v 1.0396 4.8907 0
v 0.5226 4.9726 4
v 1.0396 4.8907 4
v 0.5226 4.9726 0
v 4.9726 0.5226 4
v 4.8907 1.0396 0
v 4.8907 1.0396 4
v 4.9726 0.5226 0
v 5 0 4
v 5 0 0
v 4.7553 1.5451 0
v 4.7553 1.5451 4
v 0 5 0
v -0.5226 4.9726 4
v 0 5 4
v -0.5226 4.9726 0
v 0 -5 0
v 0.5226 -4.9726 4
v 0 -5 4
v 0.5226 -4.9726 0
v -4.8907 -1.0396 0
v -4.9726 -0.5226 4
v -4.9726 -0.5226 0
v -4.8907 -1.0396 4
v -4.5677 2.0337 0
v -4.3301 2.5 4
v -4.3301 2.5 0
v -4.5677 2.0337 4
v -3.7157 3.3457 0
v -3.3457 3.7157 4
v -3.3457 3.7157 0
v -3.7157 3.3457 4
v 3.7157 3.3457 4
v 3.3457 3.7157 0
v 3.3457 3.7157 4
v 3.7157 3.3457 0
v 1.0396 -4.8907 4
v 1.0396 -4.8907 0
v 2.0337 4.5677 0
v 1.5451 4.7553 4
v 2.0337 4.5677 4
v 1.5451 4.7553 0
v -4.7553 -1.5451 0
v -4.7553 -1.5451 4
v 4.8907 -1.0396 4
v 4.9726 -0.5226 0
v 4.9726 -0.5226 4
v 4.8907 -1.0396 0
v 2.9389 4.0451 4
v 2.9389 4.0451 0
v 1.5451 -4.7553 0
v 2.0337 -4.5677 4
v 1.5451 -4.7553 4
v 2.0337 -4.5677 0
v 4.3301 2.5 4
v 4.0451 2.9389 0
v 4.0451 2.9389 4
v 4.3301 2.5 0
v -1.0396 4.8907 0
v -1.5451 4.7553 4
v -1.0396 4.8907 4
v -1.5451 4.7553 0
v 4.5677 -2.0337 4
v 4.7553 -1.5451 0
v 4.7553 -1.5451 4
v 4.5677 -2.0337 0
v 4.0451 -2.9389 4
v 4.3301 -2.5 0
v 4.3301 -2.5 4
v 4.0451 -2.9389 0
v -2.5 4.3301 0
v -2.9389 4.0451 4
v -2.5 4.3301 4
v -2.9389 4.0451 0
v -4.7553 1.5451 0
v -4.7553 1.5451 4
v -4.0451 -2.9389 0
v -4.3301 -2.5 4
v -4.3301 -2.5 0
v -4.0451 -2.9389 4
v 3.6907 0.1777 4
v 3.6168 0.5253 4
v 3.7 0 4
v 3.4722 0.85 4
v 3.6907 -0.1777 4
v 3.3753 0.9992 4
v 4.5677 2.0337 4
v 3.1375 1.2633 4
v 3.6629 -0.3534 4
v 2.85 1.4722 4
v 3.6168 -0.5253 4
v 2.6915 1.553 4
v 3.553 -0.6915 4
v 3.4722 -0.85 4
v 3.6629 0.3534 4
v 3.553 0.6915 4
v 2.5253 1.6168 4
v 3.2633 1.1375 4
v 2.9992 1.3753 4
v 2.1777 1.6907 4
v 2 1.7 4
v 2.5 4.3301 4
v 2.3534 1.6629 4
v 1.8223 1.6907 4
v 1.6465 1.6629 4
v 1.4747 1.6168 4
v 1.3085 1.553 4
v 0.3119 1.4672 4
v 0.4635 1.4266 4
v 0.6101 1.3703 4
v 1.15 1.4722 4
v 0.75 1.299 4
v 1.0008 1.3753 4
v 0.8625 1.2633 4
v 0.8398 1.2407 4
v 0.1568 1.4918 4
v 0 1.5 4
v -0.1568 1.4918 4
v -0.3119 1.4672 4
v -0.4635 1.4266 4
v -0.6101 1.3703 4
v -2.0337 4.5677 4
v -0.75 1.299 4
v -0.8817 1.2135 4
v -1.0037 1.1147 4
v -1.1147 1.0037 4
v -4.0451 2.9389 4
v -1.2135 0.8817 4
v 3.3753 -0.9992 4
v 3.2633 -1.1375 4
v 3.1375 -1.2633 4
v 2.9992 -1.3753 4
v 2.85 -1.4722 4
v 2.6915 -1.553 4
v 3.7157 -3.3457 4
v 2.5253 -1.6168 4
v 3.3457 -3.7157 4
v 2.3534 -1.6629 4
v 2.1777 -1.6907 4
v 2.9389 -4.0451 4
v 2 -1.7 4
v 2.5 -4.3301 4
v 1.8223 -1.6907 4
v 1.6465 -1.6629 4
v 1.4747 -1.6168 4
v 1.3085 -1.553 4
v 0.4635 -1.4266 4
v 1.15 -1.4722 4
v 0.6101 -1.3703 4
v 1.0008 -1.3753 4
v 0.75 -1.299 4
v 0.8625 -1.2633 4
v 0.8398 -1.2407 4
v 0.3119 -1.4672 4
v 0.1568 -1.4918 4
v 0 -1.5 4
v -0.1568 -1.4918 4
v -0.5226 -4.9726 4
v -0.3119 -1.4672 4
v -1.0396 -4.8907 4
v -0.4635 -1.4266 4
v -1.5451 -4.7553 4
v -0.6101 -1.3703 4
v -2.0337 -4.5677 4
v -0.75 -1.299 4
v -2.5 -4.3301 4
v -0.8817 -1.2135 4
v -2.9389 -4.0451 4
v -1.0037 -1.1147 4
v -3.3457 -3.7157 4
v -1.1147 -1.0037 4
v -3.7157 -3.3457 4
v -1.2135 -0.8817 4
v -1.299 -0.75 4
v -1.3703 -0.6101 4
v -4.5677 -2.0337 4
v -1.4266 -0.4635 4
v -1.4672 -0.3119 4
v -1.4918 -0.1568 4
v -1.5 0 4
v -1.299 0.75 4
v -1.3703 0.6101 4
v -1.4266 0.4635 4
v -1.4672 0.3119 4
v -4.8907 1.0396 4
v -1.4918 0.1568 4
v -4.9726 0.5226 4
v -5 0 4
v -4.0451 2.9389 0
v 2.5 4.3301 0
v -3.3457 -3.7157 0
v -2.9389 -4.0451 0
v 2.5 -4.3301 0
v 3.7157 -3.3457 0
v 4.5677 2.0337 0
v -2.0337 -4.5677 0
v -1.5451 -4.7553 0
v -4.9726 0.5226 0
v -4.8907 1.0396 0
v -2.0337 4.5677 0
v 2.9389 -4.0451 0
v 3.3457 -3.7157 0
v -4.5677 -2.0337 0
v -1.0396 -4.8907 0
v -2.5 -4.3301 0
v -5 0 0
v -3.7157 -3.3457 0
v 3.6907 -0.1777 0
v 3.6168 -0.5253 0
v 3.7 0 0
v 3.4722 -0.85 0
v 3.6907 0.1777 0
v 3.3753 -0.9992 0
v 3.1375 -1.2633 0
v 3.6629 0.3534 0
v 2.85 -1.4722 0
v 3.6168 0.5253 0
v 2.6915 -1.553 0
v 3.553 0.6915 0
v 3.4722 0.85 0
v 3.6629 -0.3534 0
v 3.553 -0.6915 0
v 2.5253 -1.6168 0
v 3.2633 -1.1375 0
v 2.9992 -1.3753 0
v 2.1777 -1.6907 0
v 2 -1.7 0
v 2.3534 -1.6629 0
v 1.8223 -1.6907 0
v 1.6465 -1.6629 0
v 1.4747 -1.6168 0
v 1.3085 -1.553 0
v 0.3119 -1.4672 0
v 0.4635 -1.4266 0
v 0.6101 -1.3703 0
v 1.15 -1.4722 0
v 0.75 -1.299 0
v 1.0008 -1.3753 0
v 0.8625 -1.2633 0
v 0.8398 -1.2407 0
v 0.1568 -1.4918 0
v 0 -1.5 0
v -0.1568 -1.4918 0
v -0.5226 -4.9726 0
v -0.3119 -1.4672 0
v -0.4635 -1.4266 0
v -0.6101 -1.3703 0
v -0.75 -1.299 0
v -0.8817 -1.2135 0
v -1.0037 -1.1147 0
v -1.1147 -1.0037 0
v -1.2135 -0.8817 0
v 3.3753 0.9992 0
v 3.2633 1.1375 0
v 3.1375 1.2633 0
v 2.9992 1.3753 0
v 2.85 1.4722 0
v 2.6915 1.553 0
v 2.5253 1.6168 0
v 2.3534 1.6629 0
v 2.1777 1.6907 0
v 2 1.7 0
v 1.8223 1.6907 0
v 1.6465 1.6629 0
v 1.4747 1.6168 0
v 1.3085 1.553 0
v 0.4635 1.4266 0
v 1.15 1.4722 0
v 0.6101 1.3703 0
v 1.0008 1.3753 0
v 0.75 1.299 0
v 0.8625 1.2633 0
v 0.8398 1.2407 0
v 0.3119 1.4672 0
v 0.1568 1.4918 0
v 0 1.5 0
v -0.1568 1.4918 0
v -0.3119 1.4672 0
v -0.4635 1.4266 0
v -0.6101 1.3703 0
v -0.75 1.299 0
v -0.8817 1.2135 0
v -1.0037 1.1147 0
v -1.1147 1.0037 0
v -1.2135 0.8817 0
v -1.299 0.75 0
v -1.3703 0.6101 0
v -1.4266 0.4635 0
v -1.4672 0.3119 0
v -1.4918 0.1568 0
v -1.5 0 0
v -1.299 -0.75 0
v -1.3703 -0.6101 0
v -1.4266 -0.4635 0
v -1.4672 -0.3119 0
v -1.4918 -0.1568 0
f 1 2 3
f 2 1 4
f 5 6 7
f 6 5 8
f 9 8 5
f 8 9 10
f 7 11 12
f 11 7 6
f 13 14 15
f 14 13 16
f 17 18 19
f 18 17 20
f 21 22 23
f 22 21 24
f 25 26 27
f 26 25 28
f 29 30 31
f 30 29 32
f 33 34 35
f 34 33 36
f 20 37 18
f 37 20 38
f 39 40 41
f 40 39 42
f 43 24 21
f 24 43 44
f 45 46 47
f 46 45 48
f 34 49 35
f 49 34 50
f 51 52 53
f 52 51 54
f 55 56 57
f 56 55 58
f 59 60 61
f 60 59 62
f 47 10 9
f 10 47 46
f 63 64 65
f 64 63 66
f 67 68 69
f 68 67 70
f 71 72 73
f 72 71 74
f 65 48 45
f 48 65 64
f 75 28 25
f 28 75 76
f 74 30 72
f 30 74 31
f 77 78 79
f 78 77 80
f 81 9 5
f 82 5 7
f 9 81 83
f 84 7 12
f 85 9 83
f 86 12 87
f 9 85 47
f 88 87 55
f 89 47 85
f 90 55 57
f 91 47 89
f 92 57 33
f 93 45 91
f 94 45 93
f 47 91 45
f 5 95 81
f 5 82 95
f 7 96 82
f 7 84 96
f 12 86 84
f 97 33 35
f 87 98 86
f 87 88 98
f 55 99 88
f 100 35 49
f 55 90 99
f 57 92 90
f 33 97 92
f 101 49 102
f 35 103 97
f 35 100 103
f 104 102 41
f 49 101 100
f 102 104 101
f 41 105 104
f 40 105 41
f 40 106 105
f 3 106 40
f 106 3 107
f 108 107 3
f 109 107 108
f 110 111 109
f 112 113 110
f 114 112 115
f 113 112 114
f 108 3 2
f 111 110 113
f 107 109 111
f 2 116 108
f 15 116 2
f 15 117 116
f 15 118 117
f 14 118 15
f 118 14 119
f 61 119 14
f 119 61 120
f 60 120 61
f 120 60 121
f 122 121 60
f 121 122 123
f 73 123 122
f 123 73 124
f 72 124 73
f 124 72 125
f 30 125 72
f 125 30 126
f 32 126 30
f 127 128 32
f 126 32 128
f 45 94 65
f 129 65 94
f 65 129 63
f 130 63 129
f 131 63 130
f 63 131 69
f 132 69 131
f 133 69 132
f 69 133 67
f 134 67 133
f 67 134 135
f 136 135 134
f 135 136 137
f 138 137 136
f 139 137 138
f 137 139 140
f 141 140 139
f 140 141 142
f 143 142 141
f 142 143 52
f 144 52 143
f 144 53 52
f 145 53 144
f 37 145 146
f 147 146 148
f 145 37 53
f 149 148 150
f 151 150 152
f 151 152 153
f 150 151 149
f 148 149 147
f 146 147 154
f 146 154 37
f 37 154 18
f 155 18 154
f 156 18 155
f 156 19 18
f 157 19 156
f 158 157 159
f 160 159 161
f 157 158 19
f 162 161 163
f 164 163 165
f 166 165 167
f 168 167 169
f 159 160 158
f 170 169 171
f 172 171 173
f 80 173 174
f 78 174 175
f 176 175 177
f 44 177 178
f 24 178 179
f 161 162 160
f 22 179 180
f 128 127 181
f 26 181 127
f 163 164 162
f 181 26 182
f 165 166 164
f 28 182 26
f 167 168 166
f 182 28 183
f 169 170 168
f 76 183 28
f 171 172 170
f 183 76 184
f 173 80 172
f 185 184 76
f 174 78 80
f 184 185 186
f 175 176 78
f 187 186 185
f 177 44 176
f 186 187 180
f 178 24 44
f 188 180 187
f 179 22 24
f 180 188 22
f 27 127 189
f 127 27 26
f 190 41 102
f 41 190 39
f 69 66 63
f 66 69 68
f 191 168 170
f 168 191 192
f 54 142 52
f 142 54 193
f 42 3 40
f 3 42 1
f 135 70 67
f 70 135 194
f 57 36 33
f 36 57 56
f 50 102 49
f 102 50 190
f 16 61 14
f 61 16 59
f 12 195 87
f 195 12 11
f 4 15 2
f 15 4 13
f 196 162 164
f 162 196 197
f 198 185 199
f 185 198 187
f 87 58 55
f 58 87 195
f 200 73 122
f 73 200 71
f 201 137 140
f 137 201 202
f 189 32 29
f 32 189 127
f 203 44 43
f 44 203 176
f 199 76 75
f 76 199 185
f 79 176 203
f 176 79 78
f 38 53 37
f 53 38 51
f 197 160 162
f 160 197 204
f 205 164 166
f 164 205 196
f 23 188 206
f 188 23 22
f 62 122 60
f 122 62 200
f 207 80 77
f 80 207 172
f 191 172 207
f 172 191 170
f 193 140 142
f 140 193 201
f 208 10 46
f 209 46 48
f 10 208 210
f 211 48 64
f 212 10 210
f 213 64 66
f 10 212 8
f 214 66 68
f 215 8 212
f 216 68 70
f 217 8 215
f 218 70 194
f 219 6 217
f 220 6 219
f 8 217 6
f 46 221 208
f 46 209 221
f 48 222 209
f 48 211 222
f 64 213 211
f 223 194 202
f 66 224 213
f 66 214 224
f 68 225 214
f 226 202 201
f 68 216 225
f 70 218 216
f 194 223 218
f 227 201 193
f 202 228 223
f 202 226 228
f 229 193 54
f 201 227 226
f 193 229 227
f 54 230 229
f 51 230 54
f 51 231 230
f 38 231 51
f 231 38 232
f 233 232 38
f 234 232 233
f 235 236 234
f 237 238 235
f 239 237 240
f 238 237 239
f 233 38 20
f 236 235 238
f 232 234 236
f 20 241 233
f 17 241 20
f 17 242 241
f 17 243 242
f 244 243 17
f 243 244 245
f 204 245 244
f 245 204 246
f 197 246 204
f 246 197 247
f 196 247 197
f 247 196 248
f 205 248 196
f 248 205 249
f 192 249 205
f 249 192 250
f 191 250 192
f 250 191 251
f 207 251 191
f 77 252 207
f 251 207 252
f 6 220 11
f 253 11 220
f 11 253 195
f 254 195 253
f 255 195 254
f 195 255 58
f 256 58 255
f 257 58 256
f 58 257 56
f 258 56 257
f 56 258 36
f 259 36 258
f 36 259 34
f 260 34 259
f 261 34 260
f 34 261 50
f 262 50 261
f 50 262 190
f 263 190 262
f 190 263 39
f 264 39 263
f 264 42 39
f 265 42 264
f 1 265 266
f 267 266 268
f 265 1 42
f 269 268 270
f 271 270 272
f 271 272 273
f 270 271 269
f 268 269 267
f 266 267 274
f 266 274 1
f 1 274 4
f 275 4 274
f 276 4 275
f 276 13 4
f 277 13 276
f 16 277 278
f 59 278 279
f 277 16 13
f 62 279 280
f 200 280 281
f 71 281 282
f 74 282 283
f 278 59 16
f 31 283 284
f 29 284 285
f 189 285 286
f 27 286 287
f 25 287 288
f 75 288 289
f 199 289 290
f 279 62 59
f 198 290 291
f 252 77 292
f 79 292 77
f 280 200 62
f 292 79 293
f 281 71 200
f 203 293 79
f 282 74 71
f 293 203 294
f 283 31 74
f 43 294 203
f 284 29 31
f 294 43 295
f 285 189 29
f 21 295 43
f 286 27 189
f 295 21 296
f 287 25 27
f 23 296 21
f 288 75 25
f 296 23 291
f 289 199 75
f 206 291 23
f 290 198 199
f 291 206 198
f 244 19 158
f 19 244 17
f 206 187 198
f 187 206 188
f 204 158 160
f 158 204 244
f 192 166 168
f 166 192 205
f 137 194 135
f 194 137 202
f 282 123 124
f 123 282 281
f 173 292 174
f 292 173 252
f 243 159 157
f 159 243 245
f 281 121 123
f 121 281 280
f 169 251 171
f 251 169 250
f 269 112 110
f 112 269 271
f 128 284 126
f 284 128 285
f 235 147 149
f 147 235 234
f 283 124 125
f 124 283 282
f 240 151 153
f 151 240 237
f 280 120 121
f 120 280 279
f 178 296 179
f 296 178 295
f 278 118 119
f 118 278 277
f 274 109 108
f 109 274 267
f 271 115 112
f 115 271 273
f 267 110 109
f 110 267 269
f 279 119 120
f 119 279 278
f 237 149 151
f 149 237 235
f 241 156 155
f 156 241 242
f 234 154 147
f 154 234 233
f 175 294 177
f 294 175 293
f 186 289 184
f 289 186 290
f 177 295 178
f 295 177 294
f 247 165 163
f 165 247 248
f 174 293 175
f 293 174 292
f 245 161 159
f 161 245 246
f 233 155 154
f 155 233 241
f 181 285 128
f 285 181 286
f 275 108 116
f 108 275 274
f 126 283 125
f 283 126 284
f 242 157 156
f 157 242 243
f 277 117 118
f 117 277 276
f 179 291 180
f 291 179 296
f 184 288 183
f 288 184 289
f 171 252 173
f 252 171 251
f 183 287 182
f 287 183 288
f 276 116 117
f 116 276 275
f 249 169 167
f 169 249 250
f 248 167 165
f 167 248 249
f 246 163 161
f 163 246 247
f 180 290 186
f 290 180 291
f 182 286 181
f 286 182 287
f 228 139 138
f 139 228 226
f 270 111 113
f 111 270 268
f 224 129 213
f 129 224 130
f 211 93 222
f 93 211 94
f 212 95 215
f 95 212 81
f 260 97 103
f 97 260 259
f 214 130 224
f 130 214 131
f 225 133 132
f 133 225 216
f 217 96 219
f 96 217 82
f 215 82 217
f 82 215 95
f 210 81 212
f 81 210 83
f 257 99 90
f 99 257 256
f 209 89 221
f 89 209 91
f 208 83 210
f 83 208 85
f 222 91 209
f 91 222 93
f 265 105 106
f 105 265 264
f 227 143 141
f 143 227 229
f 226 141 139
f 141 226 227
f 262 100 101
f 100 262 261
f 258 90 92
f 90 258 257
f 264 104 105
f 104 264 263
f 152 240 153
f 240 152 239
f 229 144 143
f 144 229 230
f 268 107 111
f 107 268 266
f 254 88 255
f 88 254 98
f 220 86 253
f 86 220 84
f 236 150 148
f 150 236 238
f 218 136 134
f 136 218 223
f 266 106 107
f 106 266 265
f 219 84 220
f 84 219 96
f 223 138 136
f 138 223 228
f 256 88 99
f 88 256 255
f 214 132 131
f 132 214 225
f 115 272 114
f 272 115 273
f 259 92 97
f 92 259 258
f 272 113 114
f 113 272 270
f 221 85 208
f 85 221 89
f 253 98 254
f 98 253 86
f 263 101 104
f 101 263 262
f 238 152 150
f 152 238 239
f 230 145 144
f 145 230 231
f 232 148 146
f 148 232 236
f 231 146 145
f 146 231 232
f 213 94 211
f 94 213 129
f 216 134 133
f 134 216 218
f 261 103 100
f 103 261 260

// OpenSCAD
// Closed cable guide ring.
$fn = 60;
eps = 0.02;
cable_d = 3;
outer_d = 10;
thickness = 4;
difference() { cylinder(d=outer_d,h=thickness); translate([0,0,-eps]) cylinder(d=cable_d,h=thickness+2*eps); translate([outer_d/2-3,0,-eps]) cylinder(d=3.4,h=thickness+2*eps); }
